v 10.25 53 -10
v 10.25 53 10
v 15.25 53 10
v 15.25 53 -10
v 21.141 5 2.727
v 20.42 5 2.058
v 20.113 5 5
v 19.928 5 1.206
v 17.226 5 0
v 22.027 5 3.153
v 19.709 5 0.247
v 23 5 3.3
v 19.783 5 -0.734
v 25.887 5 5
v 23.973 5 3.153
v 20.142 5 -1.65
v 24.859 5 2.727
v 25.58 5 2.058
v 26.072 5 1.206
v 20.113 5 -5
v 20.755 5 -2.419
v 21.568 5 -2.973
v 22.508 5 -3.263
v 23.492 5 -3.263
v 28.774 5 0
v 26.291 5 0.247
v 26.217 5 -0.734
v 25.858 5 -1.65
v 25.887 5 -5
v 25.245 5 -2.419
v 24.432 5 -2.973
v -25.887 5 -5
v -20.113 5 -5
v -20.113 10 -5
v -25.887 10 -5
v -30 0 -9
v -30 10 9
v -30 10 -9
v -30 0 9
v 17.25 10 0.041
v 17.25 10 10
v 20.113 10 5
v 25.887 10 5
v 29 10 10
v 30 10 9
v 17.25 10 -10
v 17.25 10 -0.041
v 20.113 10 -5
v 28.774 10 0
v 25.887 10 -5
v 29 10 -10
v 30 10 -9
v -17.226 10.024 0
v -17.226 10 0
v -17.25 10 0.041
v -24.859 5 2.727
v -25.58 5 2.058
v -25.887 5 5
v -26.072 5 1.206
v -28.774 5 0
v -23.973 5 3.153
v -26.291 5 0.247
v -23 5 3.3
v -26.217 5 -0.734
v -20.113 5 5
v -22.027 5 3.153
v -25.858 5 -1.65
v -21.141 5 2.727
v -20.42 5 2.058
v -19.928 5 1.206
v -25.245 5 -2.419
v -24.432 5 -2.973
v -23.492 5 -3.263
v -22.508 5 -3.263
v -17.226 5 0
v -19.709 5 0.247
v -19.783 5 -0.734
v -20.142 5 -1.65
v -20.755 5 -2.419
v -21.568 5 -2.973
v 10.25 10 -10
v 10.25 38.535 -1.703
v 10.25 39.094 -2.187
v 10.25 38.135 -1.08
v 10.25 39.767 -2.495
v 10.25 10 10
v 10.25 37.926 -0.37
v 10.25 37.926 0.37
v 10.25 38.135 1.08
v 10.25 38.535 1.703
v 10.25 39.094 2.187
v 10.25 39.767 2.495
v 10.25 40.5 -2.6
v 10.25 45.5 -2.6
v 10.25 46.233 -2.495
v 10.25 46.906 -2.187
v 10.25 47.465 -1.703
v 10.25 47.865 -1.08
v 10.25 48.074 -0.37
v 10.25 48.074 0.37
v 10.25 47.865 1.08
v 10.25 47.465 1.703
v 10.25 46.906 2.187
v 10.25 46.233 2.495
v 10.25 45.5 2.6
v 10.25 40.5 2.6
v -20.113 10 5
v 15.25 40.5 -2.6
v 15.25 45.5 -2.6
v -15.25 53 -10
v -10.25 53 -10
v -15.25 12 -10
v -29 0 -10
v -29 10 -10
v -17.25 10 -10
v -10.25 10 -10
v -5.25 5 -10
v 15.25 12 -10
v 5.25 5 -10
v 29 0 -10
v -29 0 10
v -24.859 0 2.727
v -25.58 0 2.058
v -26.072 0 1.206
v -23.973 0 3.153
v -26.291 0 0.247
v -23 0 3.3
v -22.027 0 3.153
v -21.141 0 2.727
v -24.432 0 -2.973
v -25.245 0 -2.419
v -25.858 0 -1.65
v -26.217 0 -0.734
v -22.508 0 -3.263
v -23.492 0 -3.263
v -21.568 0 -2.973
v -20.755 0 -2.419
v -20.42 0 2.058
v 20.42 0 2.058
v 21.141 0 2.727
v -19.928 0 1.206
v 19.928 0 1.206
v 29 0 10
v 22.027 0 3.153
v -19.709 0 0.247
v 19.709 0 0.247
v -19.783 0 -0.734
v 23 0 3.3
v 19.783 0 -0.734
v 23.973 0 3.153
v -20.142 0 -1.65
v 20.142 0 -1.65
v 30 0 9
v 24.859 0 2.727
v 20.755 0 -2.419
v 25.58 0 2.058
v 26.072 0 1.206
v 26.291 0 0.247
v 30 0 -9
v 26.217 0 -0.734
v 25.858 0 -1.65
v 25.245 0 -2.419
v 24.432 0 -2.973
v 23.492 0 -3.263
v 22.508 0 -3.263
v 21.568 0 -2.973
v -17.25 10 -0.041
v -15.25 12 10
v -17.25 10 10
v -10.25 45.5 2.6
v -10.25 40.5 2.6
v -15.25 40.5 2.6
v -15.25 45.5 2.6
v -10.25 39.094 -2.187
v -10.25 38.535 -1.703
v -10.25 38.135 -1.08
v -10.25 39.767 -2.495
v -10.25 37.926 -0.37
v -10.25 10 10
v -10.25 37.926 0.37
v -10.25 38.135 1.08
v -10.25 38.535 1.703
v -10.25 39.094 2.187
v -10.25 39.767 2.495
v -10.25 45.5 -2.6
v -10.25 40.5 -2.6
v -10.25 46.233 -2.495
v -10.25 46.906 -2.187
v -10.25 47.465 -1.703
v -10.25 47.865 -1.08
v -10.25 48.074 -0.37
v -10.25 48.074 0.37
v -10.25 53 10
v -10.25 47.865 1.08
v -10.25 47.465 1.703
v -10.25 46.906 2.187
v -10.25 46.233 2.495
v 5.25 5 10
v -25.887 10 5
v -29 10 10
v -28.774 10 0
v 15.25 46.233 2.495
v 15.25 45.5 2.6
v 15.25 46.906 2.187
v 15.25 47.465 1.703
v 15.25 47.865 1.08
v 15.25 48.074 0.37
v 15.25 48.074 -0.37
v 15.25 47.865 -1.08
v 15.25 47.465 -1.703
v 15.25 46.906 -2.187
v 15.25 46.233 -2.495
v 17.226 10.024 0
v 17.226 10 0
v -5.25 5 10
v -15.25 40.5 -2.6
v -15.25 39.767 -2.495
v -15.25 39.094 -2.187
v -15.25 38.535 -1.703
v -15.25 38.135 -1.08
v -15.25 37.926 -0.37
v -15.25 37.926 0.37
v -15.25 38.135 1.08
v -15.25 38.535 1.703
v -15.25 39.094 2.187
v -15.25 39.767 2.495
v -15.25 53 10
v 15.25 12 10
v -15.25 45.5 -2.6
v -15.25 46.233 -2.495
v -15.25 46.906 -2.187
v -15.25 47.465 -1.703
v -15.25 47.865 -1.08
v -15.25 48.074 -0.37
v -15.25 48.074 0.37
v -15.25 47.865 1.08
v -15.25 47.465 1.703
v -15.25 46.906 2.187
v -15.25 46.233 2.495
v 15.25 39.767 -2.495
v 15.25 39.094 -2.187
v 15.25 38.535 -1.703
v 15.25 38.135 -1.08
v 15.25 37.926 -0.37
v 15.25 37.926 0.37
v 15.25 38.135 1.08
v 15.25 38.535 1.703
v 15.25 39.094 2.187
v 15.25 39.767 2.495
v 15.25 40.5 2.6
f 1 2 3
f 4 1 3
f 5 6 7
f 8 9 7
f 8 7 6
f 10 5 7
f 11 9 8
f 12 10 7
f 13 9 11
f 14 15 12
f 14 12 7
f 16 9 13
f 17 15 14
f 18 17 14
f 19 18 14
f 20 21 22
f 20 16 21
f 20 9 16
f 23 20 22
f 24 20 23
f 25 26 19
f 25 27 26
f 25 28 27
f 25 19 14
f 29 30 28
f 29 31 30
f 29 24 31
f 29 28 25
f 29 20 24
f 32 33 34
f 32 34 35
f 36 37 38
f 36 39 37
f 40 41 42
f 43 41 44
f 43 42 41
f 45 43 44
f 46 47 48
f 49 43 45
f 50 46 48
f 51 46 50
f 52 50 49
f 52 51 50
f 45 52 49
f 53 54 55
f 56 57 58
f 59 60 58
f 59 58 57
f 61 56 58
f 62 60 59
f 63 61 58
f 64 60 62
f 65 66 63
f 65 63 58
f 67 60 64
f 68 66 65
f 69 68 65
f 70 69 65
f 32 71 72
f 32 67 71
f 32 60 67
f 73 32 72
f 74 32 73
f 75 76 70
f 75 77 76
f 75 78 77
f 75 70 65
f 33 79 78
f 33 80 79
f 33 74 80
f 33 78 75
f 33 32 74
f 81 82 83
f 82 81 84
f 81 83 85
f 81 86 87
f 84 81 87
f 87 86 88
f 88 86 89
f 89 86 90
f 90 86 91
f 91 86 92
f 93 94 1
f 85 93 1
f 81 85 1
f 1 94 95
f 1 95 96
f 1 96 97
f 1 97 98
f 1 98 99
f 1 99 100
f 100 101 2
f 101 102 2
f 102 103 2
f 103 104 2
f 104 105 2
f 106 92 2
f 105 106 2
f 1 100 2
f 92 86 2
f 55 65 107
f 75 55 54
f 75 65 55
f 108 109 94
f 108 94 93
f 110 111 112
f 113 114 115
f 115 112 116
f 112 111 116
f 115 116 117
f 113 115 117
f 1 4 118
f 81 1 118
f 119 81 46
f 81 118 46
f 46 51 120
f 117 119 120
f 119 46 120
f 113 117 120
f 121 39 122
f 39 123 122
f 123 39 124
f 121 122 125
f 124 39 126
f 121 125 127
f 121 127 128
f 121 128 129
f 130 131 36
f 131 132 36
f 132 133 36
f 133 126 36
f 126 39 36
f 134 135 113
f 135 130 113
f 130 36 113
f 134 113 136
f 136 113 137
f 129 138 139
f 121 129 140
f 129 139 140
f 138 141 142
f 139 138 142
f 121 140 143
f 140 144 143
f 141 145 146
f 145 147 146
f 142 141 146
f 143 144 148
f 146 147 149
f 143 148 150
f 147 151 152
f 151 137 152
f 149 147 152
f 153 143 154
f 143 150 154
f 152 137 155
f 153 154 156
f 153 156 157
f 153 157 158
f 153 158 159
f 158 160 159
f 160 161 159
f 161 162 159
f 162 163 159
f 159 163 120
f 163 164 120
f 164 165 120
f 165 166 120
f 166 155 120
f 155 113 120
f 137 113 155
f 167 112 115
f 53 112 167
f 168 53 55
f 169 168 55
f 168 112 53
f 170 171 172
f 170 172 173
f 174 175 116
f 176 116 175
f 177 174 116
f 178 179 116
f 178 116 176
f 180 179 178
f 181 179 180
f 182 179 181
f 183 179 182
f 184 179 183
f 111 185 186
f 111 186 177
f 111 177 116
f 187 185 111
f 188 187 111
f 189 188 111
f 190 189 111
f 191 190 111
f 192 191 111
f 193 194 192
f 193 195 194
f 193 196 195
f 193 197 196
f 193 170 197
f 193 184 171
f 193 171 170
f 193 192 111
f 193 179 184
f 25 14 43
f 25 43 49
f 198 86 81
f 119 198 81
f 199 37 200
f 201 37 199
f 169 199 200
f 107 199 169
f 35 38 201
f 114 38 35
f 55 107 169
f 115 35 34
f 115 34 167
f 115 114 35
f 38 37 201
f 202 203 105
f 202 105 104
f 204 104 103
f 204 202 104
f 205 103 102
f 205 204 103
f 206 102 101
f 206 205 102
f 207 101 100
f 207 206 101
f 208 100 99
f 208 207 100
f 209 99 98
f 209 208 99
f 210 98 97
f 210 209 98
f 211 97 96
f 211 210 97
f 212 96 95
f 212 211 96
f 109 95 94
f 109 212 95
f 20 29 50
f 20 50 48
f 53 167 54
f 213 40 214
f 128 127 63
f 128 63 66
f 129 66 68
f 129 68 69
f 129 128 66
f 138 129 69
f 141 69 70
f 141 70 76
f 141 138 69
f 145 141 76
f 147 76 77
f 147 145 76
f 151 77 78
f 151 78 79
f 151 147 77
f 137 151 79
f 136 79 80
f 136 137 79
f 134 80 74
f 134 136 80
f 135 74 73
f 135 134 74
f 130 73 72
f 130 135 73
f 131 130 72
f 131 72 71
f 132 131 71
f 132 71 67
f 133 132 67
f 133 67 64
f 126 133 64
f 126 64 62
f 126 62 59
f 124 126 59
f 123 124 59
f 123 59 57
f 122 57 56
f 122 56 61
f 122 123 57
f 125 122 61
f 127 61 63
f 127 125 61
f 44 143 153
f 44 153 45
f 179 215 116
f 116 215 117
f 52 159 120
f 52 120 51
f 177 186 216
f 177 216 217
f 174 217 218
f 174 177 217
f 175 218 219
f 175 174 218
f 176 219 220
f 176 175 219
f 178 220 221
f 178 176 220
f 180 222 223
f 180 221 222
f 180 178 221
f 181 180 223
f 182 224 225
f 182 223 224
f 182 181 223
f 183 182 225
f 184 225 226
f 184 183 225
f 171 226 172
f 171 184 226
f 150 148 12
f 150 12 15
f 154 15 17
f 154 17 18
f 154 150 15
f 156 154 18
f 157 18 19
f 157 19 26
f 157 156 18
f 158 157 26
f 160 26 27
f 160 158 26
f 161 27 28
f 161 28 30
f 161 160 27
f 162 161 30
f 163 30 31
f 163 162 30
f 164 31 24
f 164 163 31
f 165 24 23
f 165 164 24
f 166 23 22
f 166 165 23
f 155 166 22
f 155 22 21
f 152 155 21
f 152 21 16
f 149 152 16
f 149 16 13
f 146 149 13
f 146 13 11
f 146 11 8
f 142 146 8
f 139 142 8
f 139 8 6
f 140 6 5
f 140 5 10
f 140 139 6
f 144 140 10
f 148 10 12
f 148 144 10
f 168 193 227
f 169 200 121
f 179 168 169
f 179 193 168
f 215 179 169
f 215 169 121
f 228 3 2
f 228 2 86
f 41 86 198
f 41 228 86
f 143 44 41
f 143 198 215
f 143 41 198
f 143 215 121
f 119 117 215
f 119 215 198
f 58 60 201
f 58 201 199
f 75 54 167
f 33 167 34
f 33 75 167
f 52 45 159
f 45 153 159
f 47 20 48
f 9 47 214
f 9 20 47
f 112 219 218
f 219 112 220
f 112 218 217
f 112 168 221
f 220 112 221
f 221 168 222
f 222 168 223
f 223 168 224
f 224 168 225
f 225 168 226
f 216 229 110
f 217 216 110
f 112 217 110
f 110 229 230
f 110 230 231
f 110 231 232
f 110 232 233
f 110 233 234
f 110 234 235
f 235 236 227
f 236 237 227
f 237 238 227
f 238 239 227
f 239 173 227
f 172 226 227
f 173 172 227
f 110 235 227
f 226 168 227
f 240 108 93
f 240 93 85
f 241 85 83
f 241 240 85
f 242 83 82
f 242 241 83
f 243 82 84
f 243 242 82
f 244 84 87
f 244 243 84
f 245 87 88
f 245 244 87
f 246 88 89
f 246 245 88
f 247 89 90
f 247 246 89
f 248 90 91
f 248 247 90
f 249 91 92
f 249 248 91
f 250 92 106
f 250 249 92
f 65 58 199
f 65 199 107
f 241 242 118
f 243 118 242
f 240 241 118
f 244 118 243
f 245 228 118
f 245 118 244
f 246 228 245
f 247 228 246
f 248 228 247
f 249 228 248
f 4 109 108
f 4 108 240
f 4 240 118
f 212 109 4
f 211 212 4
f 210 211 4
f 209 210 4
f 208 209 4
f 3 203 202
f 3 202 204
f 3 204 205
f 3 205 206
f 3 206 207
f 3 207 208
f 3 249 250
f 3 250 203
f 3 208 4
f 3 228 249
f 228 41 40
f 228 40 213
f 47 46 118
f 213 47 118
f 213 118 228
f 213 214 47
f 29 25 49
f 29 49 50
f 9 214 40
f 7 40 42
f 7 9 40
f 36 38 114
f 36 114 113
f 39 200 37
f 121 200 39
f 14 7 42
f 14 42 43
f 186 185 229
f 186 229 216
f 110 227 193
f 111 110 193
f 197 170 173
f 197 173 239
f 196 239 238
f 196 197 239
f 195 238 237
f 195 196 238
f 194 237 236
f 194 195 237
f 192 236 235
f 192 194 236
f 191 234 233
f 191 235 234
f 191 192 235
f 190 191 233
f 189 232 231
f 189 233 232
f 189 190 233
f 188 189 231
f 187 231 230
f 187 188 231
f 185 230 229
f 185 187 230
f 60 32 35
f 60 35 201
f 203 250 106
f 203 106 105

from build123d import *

# Parameters (mm, degrees)
SKETCH2_W           = 60
SKETCH2_H           = 20
SKETCH2_R           = 3.3
BOSS_EXTRUDE2_DEPTH = 5
SKETCH3_W           = 5
SKETCH3_H           = 48
BOSS_EXTRUDE3_DEPTH = 20
CUT_EXTRUDE1_REACH  = 72.403
SKETCH5_W           = 14.75
SKETCH5_H           = 20
BOSS_EXTRUDE4_DEPTH = 5
CHAMFER1_SIZE       = 2
CHAMFER2_SIZE       = 5
CHAMFER3_SIZE       = 1


with BuildPart() as part:
    # Sketch2 → Boss-Extrude2 (new body)
    with BuildSketch(Plane(origin=(0, 0, 0), x_dir=(1, 0, 0), z_dir=(0, 1, 0))):
        Rectangle(SKETCH2_W, SKETCH2_H)
        with Locations(Location((-23, 0, 0), (0, 0, 270))):
            Circle(SKETCH2_R, mode=Mode.SUBTRACT)
        with Locations(Location((23, 0, 0), (0, 0, 270))):
            Circle(SKETCH2_R, mode=Mode.SUBTRACT)
    extrude(amount=BOSS_EXTRUDE2_DEPTH)

    # Sketch3 → Boss-Extrude3 (add)
    with BuildSketch(Plane.XY.offset(10)):
        with Locations((-12.75, 29)):
            Rectangle(SKETCH3_W, SKETCH3_H)
        with Locations((12.75, 29)):
            Rectangle(SKETCH3_W, SKETCH3_H)
    extrude(amount=-BOSS_EXTRUDE3_DEPTH)

    # Cut-Extrude1: up to this face of the body (flat: up to its plane)
    cut_extrude1_end = Plane(part.part.faces().sort_by_distance((-15.25, 29, 0))[0])
    # Sketch4 → Cut-Extrude1 (cut, up to the picked face)
    with BuildSketch(Plane(origin=(15.25, 0, 0), x_dir=(0, 0, -1), z_dir=(1, 0, 0)), mode=Mode.PRIVATE) as cut_extrude1_sk1:
        with BuildLine():
            Line((2.6, 45.5), (2.6, 40.5))
            ThreePointArc((2.6, 40.5), (0, 37.9), (-2.6, 40.5))
            Line((-2.6, 40.5), (-2.6, 45.5))
            ThreePointArc((-2.6, 45.5), (0, 48.1), (2.6, 45.5))
        make_face()
    cut_extrude1_tool1 = split(extrude(cut_extrude1_sk1.sketch, amount=-CUT_EXTRUDE1_REACH, mode=Mode.PRIVATE), bisect_by=cut_extrude1_end, keep=Keep.BOTH, mode=Mode.PRIVATE)
    add(cut_extrude1_tool1.solids().sort_by(Axis((15.25, 43, 0), (-1, 0, 0)))[0], mode=Mode.SUBTRACT)

    # Sketch5 → Boss-Extrude4 (add)
    # profile 1 of 2: a face of its own
    with BuildSketch(Plane(origin=(0, 5, 0), x_dir=(1, 0, 0), z_dir=(0, 1, 0))):
        with Locations((22.625, 0)):
            Rectangle(SKETCH5_W, SKETCH5_H)
        Polygon((28.773502692, 0), (25.886751346, 5), (20.113248654, 5), (17.226497308, 0), (20.113248654, -5), (25.886751346, -5), align=None, mode=Mode.SUBTRACT)
    # profile 2 of 2: a face of its own
    with BuildSketch(Plane(origin=(0, 5, 0), x_dir=(1, 0, 0), z_dir=(0, 1, 0))):
        with Locations((-22.625, 0)):
            Rectangle(SKETCH5_W, SKETCH5_H)
        Polygon((-17.226497308, 0), (-20.113248654, 5), (-25.886751346, 5), (-28.773502692, 0), (-25.886751346, -5), (-20.113248654, -5), align=None, mode=Mode.SUBTRACT)
    extrude(amount=BOSS_EXTRUDE4_DEPTH)

    # Chamfer1
    # the kernel refuses this chamfer: 2 mm, written as the material it adds along each edge
    with BuildSketch(Plane(origin=(15.25, 10, -10), x_dir=(0.9996219169112968, -0.02749587661058651, 0), z_dir=(0, 0, 1))) as chamfer1_piece_1_section:
        Polygon((CHAMFER1_SIZE * 0.999621916911, CHAMFER1_SIZE * 0.0274958766106), (-CHAMFER1_SIZE * 0.0274958766106, CHAMFER1_SIZE * 0.999621916911), (0, 0), align=None)
    chamfer1_piece_1 = extrude(amount=20, mode=Mode.PRIVATE)
    chamfer1_piece_1 = split(chamfer1_piece_1, bisect_by=Plane(origin=(14.273862805, 10.629145716, -5.114112976), z_dir=(0.8660254037844387, 0, -0.49999999999999994)), keep=Keep.TOP, mode=Mode.PRIVATE)
    chamfer1_piece_1 = split(chamfer1_piece_1, bisect_by=Plane(origin=(19.549147449, 10.629145716, -4.022948051), z_dir=(-0.8660254037844387, 0, -0.49999999999999994)), keep=Keep.TOP, mode=Mode.PRIVATE)
    add(chamfer1_piece_1)
    with BuildSketch(Plane(origin=(15.25, 10, -10), x_dir=(0.9996219169112968, -0.02749587661058651, 0), z_dir=(0, 0, 1))) as chamfer1_piece_2_section:
        Polygon((CHAMFER1_SIZE * 0.999621916911, CHAMFER1_SIZE * 0.0274958766106), (-CHAMFER1_SIZE * 0.0274958766106, CHAMFER1_SIZE * 0.999621916911), (0, 0), align=None)
    chamfer1_piece_2 = extrude(amount=20, mode=Mode.PRIVATE)
    chamfer1_piece_2 = split(chamfer1_piece_2, bisect_by=Plane(origin=(16.849076721, 10.762644927, -0.653711633), z_dir=(-0.8660254037844387, 0, 0.49999999999999994)), keep=Keep.TOP, mode=Mode.PRIVATE)
    chamfer1_piece_2 = split(chamfer1_piece_2, bisect_by=Plane(origin=(16.849076721, 10.762644927, 0.653711633), z_dir=(-0.8660254037844387, 0, -0.49999999999999994)), keep=Keep.TOP, mode=Mode.PRIVATE)
    add(chamfer1_piece_2)
    with BuildSketch(Plane(origin=(15.25, 10, -10), x_dir=(0.9996219169112968, -0.02749587661058651, 0), z_dir=(0, 0, 1))) as chamfer1_piece_3_section:
        Polygon((CHAMFER1_SIZE * 0.999621916911, CHAMFER1_SIZE * 0.0274958766106), (-CHAMFER1_SIZE * 0.0274958766106, CHAMFER1_SIZE * 0.999621916911), (0, 0), align=None)
    chamfer1_piece_3 = extrude(amount=20, mode=Mode.PRIVATE)
    chamfer1_piece_3 = split(chamfer1_piece_3, bisect_by=Plane(origin=(19.549147449, 10.629145716, 4.022948051), z_dir=(-0.8660254037844387, 0, 0.49999999999999994)), keep=Keep.TOP, mode=Mode.PRIVATE)
    chamfer1_piece_3 = split(chamfer1_piece_3, bisect_by=Plane(origin=(14.273862805, 10.629145716, 5.114112976), z_dir=(0.8660254037844387, 0, 0.49999999999999994)), keep=Keep.TOP, mode=Mode.PRIVATE)
    add(chamfer1_piece_3)
    with BuildSketch(Plane(origin=(-15.25, 10, 10), x_dir=(0.027495876610586487, 0.9996219169112968, 0), z_dir=(0, 0, -1))) as chamfer1_piece_4_section:
        Polygon((CHAMFER1_SIZE * 0.999621916911, -CHAMFER1_SIZE * 0.0274958766106), (-CHAMFER1_SIZE * 0.0274958766106, -CHAMFER1_SIZE * 0.999621916911), (0, 0), align=None)
    chamfer1_piece_4 = extrude(amount=20, mode=Mode.PRIVATE)
    chamfer1_piece_4 = split(chamfer1_piece_4, bisect_by=Plane(origin=(-14.273862805, 10.629145716, 5.114112976), z_dir=(-0.8660254037844387, 0, 0.49999999999999994)), keep=Keep.TOP, mode=Mode.PRIVATE)
    chamfer1_piece_4 = split(chamfer1_piece_4, bisect_by=Plane(origin=(-19.549147449, 10.629145716, 4.022948051), z_dir=(0.8660254037844388, 0, 0.49999999999999967)), keep=Keep.TOP, mode=Mode.PRIVATE)
    add(chamfer1_piece_4)
    with BuildSketch(Plane(origin=(-15.25, 10, 10), x_dir=(0.027495876610586487, 0.9996219169112968, 0), z_dir=(0, 0, -1))) as chamfer1_piece_5_section:
        Polygon((CHAMFER1_SIZE * 0.999621916911, -CHAMFER1_SIZE * 0.0274958766106), (-CHAMFER1_SIZE * 0.0274958766106, -CHAMFER1_SIZE * 0.999621916911), (0, 0), align=None)
    chamfer1_piece_5 = extrude(amount=20, mode=Mode.PRIVATE)
    chamfer1_piece_5 = split(chamfer1_piece_5, bisect_by=Plane(origin=(-16.849076721, 10.762644927, 0.653711633), z_dir=(0.8660254037844387, 0, -0.49999999999999994)), keep=Keep.TOP, mode=Mode.PRIVATE)
    chamfer1_piece_5 = split(chamfer1_piece_5, bisect_by=Plane(origin=(-16.849076721, 10.762644927, -0.653711633), z_dir=(0.8660254037844388, 0, 0.49999999999999967)), keep=Keep.TOP, mode=Mode.PRIVATE)
    add(chamfer1_piece_5)
    with BuildSketch(Plane(origin=(-15.25, 10, 10), x_dir=(0.027495876610586487, 0.9996219169112968, 0), z_dir=(0, 0, -1))) as chamfer1_piece_6_section:
        Polygon((CHAMFER1_SIZE * 0.999621916911, -CHAMFER1_SIZE * 0.0274958766106), (-CHAMFER1_SIZE * 0.0274958766106, -CHAMFER1_SIZE * 0.999621916911), (0, 0), align=None)
    chamfer1_piece_6 = extrude(amount=20, mode=Mode.PRIVATE)
    chamfer1_piece_6 = split(chamfer1_piece_6, bisect_by=Plane(origin=(-19.549147449, 10.629145716, -4.022948051), z_dir=(0.8660254037844387, 0, -0.49999999999999994)), keep=Keep.TOP, mode=Mode.PRIVATE)
    chamfer1_piece_6 = split(chamfer1_piece_6, bisect_by=Plane(origin=(-14.273862805, 10.629145716, -5.114112976), z_dir=(-0.8660254037844388, 0, -0.49999999999999967)), keep=Keep.TOP, mode=Mode.PRIVATE)
    add(chamfer1_piece_6)

    # Chamfer2
    chamfer2_edges = [part.edges().sort_by_distance(p)[0] for p in [
        (-10.25, 5, 0),
        (10.25, 5, 0),
    ]]
    chamfer(chamfer2_edges, length=CHAMFER2_SIZE)

    # Chamfer3
    chamfer3_edges = [part.edges().sort_by_distance(p)[0] for p in [
        (30, 5, 10),
        (-30, 5, 10),
        (-30, 5, -10),
        (30, 5, -10),
    ]]
    chamfer(chamfer3_edges, length=CHAMFER3_SIZE)


solid = part.part
